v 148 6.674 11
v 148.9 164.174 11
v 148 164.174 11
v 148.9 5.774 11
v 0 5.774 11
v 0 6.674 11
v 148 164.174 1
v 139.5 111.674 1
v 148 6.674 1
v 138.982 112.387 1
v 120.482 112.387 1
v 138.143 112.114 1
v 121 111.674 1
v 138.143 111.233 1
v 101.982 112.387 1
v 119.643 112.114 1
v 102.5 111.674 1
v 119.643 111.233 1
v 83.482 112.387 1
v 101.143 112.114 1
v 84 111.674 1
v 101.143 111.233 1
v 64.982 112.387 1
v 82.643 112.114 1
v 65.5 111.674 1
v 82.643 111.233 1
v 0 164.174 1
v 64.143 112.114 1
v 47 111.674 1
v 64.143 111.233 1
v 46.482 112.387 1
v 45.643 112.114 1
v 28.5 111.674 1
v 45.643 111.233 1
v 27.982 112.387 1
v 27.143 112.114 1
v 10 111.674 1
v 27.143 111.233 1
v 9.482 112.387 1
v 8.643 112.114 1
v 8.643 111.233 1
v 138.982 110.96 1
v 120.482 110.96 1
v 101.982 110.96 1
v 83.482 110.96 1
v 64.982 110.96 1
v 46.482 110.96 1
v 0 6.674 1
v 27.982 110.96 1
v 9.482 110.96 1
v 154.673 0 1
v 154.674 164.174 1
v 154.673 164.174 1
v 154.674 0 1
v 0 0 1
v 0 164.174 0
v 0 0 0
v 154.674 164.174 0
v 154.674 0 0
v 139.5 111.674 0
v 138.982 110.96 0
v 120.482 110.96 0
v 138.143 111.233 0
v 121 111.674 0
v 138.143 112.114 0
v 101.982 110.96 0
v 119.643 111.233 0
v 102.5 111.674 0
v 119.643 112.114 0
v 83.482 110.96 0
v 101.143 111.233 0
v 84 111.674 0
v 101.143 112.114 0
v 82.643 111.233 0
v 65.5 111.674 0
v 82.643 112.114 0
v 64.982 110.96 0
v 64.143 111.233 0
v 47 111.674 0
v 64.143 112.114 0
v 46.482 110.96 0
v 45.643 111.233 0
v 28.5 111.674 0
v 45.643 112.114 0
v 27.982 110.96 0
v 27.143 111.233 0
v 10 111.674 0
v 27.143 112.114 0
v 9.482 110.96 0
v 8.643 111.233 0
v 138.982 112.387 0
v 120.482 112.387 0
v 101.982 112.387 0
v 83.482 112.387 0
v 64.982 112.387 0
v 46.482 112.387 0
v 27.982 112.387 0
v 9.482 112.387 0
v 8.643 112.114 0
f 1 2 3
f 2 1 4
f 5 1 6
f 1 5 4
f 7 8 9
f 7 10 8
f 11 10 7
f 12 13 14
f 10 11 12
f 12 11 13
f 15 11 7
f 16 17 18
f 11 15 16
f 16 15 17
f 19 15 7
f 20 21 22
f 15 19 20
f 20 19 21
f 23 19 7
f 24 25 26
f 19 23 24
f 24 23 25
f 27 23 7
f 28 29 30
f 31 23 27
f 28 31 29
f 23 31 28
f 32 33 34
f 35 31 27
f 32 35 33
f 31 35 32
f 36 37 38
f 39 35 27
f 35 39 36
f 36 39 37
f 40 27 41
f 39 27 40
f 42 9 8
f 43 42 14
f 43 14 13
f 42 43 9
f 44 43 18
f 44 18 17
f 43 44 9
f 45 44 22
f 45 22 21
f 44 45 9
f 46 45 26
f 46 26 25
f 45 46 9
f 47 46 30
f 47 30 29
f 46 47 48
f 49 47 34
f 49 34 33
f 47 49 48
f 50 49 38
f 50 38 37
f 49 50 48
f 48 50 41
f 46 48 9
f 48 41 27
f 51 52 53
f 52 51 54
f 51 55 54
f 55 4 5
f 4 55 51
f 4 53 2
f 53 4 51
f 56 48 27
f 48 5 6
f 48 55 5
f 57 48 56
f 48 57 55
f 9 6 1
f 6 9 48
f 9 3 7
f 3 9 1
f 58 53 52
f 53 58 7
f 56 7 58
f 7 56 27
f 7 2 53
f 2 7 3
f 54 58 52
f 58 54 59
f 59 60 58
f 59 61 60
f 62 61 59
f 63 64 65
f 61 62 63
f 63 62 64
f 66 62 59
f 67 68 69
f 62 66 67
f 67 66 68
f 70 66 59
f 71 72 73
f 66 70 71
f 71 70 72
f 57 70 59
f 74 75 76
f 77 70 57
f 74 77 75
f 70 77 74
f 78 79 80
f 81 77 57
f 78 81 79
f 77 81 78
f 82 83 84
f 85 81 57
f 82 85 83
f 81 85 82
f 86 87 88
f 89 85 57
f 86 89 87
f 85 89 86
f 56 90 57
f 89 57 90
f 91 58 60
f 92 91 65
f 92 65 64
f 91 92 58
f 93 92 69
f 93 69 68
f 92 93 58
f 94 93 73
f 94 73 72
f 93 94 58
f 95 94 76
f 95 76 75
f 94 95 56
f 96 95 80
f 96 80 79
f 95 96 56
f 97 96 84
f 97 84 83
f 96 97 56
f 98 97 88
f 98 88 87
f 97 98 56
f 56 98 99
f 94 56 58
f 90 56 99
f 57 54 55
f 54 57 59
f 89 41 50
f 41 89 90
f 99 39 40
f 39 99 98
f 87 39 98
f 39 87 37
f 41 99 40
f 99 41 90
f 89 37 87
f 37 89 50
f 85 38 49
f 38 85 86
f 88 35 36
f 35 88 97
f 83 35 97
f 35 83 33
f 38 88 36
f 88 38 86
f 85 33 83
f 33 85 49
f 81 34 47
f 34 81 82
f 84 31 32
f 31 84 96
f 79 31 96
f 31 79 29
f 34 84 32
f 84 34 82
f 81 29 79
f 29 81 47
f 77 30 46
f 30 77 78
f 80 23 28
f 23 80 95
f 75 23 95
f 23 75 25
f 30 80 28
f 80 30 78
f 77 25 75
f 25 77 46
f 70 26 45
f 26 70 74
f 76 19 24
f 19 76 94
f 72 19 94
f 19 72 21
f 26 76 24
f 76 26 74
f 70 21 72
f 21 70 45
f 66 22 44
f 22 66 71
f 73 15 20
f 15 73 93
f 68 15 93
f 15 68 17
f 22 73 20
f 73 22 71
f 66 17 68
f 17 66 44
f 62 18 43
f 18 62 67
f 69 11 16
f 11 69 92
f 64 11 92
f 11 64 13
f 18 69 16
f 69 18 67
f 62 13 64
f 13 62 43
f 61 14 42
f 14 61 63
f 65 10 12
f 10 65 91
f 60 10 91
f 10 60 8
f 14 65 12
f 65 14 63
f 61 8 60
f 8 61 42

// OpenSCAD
// Dimensions of A5 (ISO 216) paper
a5 = [148, 210];

// Intended print settings
layer_height    = 0.25;
extrusion_width = 0.45;

wall_angle  = 60;
wall_height = 10;
wall_top    = extrusion_width * 2;
wall_slope  = wall_height / tan(wall_angle);
wall_total  = wall_top + wall_slope;

base_size = [
    a5.x        + wall_total,
    a5.y * 0.75 + wall_total,
    layer_height * 4,
];

hole_diameter = 1.5;
hole_offset   = hole_diameter * 3;

hole_distance_nominal = 20;
num_holes             = round(a5.x / hole_distance_nominal / 2) * 2;
hole_distance_actual  = a5.x / num_holes;


bottom();


module bottom() {
    difference() {
        union() {
            base();

            translate([0, 0, base_size.z])
            union() {
                translate([-wall_total, 0, 0])
                front_wall(base_size.x - wall_total);

                translate([0, wall_total, 0])
                side_wall(base_size.y - wall_total);

                intersection() {
                    front_wall(wall_total);
                    side_wall(wall_total);
                }
            }
        }

        translate([0, wall_total + a5.y / 2, 0])
        holes();
    }

    module base() {
        cube(base_size);
    }

    module front_wall(length) {
        translate([base_size.x, wall_total, 0])
        rotate([0, -90, 0])
        rotate([0, 0, -90])
        wall(length);
    }

    module side_wall(length) {
        translate([base_size.x - wall_total, length, 0])
        rotate([90, 0, 0])
        wall(length);
    }

    module wall(length) {
        linear_extrude(length)
        polygon([
            [         0,           0],
            [wall_total,           0],
            [  wall_top, wall_height],
            [         0, wall_height],
        ]);
    }
}

module holes() {
    for (i = [1:num_holes]) {
        translate([hole_distance_actual * (i - 0.5), 0, 0])
        cylinder(d = hole_diameter, h = base_size.z * 4, center = true);
    }
}
